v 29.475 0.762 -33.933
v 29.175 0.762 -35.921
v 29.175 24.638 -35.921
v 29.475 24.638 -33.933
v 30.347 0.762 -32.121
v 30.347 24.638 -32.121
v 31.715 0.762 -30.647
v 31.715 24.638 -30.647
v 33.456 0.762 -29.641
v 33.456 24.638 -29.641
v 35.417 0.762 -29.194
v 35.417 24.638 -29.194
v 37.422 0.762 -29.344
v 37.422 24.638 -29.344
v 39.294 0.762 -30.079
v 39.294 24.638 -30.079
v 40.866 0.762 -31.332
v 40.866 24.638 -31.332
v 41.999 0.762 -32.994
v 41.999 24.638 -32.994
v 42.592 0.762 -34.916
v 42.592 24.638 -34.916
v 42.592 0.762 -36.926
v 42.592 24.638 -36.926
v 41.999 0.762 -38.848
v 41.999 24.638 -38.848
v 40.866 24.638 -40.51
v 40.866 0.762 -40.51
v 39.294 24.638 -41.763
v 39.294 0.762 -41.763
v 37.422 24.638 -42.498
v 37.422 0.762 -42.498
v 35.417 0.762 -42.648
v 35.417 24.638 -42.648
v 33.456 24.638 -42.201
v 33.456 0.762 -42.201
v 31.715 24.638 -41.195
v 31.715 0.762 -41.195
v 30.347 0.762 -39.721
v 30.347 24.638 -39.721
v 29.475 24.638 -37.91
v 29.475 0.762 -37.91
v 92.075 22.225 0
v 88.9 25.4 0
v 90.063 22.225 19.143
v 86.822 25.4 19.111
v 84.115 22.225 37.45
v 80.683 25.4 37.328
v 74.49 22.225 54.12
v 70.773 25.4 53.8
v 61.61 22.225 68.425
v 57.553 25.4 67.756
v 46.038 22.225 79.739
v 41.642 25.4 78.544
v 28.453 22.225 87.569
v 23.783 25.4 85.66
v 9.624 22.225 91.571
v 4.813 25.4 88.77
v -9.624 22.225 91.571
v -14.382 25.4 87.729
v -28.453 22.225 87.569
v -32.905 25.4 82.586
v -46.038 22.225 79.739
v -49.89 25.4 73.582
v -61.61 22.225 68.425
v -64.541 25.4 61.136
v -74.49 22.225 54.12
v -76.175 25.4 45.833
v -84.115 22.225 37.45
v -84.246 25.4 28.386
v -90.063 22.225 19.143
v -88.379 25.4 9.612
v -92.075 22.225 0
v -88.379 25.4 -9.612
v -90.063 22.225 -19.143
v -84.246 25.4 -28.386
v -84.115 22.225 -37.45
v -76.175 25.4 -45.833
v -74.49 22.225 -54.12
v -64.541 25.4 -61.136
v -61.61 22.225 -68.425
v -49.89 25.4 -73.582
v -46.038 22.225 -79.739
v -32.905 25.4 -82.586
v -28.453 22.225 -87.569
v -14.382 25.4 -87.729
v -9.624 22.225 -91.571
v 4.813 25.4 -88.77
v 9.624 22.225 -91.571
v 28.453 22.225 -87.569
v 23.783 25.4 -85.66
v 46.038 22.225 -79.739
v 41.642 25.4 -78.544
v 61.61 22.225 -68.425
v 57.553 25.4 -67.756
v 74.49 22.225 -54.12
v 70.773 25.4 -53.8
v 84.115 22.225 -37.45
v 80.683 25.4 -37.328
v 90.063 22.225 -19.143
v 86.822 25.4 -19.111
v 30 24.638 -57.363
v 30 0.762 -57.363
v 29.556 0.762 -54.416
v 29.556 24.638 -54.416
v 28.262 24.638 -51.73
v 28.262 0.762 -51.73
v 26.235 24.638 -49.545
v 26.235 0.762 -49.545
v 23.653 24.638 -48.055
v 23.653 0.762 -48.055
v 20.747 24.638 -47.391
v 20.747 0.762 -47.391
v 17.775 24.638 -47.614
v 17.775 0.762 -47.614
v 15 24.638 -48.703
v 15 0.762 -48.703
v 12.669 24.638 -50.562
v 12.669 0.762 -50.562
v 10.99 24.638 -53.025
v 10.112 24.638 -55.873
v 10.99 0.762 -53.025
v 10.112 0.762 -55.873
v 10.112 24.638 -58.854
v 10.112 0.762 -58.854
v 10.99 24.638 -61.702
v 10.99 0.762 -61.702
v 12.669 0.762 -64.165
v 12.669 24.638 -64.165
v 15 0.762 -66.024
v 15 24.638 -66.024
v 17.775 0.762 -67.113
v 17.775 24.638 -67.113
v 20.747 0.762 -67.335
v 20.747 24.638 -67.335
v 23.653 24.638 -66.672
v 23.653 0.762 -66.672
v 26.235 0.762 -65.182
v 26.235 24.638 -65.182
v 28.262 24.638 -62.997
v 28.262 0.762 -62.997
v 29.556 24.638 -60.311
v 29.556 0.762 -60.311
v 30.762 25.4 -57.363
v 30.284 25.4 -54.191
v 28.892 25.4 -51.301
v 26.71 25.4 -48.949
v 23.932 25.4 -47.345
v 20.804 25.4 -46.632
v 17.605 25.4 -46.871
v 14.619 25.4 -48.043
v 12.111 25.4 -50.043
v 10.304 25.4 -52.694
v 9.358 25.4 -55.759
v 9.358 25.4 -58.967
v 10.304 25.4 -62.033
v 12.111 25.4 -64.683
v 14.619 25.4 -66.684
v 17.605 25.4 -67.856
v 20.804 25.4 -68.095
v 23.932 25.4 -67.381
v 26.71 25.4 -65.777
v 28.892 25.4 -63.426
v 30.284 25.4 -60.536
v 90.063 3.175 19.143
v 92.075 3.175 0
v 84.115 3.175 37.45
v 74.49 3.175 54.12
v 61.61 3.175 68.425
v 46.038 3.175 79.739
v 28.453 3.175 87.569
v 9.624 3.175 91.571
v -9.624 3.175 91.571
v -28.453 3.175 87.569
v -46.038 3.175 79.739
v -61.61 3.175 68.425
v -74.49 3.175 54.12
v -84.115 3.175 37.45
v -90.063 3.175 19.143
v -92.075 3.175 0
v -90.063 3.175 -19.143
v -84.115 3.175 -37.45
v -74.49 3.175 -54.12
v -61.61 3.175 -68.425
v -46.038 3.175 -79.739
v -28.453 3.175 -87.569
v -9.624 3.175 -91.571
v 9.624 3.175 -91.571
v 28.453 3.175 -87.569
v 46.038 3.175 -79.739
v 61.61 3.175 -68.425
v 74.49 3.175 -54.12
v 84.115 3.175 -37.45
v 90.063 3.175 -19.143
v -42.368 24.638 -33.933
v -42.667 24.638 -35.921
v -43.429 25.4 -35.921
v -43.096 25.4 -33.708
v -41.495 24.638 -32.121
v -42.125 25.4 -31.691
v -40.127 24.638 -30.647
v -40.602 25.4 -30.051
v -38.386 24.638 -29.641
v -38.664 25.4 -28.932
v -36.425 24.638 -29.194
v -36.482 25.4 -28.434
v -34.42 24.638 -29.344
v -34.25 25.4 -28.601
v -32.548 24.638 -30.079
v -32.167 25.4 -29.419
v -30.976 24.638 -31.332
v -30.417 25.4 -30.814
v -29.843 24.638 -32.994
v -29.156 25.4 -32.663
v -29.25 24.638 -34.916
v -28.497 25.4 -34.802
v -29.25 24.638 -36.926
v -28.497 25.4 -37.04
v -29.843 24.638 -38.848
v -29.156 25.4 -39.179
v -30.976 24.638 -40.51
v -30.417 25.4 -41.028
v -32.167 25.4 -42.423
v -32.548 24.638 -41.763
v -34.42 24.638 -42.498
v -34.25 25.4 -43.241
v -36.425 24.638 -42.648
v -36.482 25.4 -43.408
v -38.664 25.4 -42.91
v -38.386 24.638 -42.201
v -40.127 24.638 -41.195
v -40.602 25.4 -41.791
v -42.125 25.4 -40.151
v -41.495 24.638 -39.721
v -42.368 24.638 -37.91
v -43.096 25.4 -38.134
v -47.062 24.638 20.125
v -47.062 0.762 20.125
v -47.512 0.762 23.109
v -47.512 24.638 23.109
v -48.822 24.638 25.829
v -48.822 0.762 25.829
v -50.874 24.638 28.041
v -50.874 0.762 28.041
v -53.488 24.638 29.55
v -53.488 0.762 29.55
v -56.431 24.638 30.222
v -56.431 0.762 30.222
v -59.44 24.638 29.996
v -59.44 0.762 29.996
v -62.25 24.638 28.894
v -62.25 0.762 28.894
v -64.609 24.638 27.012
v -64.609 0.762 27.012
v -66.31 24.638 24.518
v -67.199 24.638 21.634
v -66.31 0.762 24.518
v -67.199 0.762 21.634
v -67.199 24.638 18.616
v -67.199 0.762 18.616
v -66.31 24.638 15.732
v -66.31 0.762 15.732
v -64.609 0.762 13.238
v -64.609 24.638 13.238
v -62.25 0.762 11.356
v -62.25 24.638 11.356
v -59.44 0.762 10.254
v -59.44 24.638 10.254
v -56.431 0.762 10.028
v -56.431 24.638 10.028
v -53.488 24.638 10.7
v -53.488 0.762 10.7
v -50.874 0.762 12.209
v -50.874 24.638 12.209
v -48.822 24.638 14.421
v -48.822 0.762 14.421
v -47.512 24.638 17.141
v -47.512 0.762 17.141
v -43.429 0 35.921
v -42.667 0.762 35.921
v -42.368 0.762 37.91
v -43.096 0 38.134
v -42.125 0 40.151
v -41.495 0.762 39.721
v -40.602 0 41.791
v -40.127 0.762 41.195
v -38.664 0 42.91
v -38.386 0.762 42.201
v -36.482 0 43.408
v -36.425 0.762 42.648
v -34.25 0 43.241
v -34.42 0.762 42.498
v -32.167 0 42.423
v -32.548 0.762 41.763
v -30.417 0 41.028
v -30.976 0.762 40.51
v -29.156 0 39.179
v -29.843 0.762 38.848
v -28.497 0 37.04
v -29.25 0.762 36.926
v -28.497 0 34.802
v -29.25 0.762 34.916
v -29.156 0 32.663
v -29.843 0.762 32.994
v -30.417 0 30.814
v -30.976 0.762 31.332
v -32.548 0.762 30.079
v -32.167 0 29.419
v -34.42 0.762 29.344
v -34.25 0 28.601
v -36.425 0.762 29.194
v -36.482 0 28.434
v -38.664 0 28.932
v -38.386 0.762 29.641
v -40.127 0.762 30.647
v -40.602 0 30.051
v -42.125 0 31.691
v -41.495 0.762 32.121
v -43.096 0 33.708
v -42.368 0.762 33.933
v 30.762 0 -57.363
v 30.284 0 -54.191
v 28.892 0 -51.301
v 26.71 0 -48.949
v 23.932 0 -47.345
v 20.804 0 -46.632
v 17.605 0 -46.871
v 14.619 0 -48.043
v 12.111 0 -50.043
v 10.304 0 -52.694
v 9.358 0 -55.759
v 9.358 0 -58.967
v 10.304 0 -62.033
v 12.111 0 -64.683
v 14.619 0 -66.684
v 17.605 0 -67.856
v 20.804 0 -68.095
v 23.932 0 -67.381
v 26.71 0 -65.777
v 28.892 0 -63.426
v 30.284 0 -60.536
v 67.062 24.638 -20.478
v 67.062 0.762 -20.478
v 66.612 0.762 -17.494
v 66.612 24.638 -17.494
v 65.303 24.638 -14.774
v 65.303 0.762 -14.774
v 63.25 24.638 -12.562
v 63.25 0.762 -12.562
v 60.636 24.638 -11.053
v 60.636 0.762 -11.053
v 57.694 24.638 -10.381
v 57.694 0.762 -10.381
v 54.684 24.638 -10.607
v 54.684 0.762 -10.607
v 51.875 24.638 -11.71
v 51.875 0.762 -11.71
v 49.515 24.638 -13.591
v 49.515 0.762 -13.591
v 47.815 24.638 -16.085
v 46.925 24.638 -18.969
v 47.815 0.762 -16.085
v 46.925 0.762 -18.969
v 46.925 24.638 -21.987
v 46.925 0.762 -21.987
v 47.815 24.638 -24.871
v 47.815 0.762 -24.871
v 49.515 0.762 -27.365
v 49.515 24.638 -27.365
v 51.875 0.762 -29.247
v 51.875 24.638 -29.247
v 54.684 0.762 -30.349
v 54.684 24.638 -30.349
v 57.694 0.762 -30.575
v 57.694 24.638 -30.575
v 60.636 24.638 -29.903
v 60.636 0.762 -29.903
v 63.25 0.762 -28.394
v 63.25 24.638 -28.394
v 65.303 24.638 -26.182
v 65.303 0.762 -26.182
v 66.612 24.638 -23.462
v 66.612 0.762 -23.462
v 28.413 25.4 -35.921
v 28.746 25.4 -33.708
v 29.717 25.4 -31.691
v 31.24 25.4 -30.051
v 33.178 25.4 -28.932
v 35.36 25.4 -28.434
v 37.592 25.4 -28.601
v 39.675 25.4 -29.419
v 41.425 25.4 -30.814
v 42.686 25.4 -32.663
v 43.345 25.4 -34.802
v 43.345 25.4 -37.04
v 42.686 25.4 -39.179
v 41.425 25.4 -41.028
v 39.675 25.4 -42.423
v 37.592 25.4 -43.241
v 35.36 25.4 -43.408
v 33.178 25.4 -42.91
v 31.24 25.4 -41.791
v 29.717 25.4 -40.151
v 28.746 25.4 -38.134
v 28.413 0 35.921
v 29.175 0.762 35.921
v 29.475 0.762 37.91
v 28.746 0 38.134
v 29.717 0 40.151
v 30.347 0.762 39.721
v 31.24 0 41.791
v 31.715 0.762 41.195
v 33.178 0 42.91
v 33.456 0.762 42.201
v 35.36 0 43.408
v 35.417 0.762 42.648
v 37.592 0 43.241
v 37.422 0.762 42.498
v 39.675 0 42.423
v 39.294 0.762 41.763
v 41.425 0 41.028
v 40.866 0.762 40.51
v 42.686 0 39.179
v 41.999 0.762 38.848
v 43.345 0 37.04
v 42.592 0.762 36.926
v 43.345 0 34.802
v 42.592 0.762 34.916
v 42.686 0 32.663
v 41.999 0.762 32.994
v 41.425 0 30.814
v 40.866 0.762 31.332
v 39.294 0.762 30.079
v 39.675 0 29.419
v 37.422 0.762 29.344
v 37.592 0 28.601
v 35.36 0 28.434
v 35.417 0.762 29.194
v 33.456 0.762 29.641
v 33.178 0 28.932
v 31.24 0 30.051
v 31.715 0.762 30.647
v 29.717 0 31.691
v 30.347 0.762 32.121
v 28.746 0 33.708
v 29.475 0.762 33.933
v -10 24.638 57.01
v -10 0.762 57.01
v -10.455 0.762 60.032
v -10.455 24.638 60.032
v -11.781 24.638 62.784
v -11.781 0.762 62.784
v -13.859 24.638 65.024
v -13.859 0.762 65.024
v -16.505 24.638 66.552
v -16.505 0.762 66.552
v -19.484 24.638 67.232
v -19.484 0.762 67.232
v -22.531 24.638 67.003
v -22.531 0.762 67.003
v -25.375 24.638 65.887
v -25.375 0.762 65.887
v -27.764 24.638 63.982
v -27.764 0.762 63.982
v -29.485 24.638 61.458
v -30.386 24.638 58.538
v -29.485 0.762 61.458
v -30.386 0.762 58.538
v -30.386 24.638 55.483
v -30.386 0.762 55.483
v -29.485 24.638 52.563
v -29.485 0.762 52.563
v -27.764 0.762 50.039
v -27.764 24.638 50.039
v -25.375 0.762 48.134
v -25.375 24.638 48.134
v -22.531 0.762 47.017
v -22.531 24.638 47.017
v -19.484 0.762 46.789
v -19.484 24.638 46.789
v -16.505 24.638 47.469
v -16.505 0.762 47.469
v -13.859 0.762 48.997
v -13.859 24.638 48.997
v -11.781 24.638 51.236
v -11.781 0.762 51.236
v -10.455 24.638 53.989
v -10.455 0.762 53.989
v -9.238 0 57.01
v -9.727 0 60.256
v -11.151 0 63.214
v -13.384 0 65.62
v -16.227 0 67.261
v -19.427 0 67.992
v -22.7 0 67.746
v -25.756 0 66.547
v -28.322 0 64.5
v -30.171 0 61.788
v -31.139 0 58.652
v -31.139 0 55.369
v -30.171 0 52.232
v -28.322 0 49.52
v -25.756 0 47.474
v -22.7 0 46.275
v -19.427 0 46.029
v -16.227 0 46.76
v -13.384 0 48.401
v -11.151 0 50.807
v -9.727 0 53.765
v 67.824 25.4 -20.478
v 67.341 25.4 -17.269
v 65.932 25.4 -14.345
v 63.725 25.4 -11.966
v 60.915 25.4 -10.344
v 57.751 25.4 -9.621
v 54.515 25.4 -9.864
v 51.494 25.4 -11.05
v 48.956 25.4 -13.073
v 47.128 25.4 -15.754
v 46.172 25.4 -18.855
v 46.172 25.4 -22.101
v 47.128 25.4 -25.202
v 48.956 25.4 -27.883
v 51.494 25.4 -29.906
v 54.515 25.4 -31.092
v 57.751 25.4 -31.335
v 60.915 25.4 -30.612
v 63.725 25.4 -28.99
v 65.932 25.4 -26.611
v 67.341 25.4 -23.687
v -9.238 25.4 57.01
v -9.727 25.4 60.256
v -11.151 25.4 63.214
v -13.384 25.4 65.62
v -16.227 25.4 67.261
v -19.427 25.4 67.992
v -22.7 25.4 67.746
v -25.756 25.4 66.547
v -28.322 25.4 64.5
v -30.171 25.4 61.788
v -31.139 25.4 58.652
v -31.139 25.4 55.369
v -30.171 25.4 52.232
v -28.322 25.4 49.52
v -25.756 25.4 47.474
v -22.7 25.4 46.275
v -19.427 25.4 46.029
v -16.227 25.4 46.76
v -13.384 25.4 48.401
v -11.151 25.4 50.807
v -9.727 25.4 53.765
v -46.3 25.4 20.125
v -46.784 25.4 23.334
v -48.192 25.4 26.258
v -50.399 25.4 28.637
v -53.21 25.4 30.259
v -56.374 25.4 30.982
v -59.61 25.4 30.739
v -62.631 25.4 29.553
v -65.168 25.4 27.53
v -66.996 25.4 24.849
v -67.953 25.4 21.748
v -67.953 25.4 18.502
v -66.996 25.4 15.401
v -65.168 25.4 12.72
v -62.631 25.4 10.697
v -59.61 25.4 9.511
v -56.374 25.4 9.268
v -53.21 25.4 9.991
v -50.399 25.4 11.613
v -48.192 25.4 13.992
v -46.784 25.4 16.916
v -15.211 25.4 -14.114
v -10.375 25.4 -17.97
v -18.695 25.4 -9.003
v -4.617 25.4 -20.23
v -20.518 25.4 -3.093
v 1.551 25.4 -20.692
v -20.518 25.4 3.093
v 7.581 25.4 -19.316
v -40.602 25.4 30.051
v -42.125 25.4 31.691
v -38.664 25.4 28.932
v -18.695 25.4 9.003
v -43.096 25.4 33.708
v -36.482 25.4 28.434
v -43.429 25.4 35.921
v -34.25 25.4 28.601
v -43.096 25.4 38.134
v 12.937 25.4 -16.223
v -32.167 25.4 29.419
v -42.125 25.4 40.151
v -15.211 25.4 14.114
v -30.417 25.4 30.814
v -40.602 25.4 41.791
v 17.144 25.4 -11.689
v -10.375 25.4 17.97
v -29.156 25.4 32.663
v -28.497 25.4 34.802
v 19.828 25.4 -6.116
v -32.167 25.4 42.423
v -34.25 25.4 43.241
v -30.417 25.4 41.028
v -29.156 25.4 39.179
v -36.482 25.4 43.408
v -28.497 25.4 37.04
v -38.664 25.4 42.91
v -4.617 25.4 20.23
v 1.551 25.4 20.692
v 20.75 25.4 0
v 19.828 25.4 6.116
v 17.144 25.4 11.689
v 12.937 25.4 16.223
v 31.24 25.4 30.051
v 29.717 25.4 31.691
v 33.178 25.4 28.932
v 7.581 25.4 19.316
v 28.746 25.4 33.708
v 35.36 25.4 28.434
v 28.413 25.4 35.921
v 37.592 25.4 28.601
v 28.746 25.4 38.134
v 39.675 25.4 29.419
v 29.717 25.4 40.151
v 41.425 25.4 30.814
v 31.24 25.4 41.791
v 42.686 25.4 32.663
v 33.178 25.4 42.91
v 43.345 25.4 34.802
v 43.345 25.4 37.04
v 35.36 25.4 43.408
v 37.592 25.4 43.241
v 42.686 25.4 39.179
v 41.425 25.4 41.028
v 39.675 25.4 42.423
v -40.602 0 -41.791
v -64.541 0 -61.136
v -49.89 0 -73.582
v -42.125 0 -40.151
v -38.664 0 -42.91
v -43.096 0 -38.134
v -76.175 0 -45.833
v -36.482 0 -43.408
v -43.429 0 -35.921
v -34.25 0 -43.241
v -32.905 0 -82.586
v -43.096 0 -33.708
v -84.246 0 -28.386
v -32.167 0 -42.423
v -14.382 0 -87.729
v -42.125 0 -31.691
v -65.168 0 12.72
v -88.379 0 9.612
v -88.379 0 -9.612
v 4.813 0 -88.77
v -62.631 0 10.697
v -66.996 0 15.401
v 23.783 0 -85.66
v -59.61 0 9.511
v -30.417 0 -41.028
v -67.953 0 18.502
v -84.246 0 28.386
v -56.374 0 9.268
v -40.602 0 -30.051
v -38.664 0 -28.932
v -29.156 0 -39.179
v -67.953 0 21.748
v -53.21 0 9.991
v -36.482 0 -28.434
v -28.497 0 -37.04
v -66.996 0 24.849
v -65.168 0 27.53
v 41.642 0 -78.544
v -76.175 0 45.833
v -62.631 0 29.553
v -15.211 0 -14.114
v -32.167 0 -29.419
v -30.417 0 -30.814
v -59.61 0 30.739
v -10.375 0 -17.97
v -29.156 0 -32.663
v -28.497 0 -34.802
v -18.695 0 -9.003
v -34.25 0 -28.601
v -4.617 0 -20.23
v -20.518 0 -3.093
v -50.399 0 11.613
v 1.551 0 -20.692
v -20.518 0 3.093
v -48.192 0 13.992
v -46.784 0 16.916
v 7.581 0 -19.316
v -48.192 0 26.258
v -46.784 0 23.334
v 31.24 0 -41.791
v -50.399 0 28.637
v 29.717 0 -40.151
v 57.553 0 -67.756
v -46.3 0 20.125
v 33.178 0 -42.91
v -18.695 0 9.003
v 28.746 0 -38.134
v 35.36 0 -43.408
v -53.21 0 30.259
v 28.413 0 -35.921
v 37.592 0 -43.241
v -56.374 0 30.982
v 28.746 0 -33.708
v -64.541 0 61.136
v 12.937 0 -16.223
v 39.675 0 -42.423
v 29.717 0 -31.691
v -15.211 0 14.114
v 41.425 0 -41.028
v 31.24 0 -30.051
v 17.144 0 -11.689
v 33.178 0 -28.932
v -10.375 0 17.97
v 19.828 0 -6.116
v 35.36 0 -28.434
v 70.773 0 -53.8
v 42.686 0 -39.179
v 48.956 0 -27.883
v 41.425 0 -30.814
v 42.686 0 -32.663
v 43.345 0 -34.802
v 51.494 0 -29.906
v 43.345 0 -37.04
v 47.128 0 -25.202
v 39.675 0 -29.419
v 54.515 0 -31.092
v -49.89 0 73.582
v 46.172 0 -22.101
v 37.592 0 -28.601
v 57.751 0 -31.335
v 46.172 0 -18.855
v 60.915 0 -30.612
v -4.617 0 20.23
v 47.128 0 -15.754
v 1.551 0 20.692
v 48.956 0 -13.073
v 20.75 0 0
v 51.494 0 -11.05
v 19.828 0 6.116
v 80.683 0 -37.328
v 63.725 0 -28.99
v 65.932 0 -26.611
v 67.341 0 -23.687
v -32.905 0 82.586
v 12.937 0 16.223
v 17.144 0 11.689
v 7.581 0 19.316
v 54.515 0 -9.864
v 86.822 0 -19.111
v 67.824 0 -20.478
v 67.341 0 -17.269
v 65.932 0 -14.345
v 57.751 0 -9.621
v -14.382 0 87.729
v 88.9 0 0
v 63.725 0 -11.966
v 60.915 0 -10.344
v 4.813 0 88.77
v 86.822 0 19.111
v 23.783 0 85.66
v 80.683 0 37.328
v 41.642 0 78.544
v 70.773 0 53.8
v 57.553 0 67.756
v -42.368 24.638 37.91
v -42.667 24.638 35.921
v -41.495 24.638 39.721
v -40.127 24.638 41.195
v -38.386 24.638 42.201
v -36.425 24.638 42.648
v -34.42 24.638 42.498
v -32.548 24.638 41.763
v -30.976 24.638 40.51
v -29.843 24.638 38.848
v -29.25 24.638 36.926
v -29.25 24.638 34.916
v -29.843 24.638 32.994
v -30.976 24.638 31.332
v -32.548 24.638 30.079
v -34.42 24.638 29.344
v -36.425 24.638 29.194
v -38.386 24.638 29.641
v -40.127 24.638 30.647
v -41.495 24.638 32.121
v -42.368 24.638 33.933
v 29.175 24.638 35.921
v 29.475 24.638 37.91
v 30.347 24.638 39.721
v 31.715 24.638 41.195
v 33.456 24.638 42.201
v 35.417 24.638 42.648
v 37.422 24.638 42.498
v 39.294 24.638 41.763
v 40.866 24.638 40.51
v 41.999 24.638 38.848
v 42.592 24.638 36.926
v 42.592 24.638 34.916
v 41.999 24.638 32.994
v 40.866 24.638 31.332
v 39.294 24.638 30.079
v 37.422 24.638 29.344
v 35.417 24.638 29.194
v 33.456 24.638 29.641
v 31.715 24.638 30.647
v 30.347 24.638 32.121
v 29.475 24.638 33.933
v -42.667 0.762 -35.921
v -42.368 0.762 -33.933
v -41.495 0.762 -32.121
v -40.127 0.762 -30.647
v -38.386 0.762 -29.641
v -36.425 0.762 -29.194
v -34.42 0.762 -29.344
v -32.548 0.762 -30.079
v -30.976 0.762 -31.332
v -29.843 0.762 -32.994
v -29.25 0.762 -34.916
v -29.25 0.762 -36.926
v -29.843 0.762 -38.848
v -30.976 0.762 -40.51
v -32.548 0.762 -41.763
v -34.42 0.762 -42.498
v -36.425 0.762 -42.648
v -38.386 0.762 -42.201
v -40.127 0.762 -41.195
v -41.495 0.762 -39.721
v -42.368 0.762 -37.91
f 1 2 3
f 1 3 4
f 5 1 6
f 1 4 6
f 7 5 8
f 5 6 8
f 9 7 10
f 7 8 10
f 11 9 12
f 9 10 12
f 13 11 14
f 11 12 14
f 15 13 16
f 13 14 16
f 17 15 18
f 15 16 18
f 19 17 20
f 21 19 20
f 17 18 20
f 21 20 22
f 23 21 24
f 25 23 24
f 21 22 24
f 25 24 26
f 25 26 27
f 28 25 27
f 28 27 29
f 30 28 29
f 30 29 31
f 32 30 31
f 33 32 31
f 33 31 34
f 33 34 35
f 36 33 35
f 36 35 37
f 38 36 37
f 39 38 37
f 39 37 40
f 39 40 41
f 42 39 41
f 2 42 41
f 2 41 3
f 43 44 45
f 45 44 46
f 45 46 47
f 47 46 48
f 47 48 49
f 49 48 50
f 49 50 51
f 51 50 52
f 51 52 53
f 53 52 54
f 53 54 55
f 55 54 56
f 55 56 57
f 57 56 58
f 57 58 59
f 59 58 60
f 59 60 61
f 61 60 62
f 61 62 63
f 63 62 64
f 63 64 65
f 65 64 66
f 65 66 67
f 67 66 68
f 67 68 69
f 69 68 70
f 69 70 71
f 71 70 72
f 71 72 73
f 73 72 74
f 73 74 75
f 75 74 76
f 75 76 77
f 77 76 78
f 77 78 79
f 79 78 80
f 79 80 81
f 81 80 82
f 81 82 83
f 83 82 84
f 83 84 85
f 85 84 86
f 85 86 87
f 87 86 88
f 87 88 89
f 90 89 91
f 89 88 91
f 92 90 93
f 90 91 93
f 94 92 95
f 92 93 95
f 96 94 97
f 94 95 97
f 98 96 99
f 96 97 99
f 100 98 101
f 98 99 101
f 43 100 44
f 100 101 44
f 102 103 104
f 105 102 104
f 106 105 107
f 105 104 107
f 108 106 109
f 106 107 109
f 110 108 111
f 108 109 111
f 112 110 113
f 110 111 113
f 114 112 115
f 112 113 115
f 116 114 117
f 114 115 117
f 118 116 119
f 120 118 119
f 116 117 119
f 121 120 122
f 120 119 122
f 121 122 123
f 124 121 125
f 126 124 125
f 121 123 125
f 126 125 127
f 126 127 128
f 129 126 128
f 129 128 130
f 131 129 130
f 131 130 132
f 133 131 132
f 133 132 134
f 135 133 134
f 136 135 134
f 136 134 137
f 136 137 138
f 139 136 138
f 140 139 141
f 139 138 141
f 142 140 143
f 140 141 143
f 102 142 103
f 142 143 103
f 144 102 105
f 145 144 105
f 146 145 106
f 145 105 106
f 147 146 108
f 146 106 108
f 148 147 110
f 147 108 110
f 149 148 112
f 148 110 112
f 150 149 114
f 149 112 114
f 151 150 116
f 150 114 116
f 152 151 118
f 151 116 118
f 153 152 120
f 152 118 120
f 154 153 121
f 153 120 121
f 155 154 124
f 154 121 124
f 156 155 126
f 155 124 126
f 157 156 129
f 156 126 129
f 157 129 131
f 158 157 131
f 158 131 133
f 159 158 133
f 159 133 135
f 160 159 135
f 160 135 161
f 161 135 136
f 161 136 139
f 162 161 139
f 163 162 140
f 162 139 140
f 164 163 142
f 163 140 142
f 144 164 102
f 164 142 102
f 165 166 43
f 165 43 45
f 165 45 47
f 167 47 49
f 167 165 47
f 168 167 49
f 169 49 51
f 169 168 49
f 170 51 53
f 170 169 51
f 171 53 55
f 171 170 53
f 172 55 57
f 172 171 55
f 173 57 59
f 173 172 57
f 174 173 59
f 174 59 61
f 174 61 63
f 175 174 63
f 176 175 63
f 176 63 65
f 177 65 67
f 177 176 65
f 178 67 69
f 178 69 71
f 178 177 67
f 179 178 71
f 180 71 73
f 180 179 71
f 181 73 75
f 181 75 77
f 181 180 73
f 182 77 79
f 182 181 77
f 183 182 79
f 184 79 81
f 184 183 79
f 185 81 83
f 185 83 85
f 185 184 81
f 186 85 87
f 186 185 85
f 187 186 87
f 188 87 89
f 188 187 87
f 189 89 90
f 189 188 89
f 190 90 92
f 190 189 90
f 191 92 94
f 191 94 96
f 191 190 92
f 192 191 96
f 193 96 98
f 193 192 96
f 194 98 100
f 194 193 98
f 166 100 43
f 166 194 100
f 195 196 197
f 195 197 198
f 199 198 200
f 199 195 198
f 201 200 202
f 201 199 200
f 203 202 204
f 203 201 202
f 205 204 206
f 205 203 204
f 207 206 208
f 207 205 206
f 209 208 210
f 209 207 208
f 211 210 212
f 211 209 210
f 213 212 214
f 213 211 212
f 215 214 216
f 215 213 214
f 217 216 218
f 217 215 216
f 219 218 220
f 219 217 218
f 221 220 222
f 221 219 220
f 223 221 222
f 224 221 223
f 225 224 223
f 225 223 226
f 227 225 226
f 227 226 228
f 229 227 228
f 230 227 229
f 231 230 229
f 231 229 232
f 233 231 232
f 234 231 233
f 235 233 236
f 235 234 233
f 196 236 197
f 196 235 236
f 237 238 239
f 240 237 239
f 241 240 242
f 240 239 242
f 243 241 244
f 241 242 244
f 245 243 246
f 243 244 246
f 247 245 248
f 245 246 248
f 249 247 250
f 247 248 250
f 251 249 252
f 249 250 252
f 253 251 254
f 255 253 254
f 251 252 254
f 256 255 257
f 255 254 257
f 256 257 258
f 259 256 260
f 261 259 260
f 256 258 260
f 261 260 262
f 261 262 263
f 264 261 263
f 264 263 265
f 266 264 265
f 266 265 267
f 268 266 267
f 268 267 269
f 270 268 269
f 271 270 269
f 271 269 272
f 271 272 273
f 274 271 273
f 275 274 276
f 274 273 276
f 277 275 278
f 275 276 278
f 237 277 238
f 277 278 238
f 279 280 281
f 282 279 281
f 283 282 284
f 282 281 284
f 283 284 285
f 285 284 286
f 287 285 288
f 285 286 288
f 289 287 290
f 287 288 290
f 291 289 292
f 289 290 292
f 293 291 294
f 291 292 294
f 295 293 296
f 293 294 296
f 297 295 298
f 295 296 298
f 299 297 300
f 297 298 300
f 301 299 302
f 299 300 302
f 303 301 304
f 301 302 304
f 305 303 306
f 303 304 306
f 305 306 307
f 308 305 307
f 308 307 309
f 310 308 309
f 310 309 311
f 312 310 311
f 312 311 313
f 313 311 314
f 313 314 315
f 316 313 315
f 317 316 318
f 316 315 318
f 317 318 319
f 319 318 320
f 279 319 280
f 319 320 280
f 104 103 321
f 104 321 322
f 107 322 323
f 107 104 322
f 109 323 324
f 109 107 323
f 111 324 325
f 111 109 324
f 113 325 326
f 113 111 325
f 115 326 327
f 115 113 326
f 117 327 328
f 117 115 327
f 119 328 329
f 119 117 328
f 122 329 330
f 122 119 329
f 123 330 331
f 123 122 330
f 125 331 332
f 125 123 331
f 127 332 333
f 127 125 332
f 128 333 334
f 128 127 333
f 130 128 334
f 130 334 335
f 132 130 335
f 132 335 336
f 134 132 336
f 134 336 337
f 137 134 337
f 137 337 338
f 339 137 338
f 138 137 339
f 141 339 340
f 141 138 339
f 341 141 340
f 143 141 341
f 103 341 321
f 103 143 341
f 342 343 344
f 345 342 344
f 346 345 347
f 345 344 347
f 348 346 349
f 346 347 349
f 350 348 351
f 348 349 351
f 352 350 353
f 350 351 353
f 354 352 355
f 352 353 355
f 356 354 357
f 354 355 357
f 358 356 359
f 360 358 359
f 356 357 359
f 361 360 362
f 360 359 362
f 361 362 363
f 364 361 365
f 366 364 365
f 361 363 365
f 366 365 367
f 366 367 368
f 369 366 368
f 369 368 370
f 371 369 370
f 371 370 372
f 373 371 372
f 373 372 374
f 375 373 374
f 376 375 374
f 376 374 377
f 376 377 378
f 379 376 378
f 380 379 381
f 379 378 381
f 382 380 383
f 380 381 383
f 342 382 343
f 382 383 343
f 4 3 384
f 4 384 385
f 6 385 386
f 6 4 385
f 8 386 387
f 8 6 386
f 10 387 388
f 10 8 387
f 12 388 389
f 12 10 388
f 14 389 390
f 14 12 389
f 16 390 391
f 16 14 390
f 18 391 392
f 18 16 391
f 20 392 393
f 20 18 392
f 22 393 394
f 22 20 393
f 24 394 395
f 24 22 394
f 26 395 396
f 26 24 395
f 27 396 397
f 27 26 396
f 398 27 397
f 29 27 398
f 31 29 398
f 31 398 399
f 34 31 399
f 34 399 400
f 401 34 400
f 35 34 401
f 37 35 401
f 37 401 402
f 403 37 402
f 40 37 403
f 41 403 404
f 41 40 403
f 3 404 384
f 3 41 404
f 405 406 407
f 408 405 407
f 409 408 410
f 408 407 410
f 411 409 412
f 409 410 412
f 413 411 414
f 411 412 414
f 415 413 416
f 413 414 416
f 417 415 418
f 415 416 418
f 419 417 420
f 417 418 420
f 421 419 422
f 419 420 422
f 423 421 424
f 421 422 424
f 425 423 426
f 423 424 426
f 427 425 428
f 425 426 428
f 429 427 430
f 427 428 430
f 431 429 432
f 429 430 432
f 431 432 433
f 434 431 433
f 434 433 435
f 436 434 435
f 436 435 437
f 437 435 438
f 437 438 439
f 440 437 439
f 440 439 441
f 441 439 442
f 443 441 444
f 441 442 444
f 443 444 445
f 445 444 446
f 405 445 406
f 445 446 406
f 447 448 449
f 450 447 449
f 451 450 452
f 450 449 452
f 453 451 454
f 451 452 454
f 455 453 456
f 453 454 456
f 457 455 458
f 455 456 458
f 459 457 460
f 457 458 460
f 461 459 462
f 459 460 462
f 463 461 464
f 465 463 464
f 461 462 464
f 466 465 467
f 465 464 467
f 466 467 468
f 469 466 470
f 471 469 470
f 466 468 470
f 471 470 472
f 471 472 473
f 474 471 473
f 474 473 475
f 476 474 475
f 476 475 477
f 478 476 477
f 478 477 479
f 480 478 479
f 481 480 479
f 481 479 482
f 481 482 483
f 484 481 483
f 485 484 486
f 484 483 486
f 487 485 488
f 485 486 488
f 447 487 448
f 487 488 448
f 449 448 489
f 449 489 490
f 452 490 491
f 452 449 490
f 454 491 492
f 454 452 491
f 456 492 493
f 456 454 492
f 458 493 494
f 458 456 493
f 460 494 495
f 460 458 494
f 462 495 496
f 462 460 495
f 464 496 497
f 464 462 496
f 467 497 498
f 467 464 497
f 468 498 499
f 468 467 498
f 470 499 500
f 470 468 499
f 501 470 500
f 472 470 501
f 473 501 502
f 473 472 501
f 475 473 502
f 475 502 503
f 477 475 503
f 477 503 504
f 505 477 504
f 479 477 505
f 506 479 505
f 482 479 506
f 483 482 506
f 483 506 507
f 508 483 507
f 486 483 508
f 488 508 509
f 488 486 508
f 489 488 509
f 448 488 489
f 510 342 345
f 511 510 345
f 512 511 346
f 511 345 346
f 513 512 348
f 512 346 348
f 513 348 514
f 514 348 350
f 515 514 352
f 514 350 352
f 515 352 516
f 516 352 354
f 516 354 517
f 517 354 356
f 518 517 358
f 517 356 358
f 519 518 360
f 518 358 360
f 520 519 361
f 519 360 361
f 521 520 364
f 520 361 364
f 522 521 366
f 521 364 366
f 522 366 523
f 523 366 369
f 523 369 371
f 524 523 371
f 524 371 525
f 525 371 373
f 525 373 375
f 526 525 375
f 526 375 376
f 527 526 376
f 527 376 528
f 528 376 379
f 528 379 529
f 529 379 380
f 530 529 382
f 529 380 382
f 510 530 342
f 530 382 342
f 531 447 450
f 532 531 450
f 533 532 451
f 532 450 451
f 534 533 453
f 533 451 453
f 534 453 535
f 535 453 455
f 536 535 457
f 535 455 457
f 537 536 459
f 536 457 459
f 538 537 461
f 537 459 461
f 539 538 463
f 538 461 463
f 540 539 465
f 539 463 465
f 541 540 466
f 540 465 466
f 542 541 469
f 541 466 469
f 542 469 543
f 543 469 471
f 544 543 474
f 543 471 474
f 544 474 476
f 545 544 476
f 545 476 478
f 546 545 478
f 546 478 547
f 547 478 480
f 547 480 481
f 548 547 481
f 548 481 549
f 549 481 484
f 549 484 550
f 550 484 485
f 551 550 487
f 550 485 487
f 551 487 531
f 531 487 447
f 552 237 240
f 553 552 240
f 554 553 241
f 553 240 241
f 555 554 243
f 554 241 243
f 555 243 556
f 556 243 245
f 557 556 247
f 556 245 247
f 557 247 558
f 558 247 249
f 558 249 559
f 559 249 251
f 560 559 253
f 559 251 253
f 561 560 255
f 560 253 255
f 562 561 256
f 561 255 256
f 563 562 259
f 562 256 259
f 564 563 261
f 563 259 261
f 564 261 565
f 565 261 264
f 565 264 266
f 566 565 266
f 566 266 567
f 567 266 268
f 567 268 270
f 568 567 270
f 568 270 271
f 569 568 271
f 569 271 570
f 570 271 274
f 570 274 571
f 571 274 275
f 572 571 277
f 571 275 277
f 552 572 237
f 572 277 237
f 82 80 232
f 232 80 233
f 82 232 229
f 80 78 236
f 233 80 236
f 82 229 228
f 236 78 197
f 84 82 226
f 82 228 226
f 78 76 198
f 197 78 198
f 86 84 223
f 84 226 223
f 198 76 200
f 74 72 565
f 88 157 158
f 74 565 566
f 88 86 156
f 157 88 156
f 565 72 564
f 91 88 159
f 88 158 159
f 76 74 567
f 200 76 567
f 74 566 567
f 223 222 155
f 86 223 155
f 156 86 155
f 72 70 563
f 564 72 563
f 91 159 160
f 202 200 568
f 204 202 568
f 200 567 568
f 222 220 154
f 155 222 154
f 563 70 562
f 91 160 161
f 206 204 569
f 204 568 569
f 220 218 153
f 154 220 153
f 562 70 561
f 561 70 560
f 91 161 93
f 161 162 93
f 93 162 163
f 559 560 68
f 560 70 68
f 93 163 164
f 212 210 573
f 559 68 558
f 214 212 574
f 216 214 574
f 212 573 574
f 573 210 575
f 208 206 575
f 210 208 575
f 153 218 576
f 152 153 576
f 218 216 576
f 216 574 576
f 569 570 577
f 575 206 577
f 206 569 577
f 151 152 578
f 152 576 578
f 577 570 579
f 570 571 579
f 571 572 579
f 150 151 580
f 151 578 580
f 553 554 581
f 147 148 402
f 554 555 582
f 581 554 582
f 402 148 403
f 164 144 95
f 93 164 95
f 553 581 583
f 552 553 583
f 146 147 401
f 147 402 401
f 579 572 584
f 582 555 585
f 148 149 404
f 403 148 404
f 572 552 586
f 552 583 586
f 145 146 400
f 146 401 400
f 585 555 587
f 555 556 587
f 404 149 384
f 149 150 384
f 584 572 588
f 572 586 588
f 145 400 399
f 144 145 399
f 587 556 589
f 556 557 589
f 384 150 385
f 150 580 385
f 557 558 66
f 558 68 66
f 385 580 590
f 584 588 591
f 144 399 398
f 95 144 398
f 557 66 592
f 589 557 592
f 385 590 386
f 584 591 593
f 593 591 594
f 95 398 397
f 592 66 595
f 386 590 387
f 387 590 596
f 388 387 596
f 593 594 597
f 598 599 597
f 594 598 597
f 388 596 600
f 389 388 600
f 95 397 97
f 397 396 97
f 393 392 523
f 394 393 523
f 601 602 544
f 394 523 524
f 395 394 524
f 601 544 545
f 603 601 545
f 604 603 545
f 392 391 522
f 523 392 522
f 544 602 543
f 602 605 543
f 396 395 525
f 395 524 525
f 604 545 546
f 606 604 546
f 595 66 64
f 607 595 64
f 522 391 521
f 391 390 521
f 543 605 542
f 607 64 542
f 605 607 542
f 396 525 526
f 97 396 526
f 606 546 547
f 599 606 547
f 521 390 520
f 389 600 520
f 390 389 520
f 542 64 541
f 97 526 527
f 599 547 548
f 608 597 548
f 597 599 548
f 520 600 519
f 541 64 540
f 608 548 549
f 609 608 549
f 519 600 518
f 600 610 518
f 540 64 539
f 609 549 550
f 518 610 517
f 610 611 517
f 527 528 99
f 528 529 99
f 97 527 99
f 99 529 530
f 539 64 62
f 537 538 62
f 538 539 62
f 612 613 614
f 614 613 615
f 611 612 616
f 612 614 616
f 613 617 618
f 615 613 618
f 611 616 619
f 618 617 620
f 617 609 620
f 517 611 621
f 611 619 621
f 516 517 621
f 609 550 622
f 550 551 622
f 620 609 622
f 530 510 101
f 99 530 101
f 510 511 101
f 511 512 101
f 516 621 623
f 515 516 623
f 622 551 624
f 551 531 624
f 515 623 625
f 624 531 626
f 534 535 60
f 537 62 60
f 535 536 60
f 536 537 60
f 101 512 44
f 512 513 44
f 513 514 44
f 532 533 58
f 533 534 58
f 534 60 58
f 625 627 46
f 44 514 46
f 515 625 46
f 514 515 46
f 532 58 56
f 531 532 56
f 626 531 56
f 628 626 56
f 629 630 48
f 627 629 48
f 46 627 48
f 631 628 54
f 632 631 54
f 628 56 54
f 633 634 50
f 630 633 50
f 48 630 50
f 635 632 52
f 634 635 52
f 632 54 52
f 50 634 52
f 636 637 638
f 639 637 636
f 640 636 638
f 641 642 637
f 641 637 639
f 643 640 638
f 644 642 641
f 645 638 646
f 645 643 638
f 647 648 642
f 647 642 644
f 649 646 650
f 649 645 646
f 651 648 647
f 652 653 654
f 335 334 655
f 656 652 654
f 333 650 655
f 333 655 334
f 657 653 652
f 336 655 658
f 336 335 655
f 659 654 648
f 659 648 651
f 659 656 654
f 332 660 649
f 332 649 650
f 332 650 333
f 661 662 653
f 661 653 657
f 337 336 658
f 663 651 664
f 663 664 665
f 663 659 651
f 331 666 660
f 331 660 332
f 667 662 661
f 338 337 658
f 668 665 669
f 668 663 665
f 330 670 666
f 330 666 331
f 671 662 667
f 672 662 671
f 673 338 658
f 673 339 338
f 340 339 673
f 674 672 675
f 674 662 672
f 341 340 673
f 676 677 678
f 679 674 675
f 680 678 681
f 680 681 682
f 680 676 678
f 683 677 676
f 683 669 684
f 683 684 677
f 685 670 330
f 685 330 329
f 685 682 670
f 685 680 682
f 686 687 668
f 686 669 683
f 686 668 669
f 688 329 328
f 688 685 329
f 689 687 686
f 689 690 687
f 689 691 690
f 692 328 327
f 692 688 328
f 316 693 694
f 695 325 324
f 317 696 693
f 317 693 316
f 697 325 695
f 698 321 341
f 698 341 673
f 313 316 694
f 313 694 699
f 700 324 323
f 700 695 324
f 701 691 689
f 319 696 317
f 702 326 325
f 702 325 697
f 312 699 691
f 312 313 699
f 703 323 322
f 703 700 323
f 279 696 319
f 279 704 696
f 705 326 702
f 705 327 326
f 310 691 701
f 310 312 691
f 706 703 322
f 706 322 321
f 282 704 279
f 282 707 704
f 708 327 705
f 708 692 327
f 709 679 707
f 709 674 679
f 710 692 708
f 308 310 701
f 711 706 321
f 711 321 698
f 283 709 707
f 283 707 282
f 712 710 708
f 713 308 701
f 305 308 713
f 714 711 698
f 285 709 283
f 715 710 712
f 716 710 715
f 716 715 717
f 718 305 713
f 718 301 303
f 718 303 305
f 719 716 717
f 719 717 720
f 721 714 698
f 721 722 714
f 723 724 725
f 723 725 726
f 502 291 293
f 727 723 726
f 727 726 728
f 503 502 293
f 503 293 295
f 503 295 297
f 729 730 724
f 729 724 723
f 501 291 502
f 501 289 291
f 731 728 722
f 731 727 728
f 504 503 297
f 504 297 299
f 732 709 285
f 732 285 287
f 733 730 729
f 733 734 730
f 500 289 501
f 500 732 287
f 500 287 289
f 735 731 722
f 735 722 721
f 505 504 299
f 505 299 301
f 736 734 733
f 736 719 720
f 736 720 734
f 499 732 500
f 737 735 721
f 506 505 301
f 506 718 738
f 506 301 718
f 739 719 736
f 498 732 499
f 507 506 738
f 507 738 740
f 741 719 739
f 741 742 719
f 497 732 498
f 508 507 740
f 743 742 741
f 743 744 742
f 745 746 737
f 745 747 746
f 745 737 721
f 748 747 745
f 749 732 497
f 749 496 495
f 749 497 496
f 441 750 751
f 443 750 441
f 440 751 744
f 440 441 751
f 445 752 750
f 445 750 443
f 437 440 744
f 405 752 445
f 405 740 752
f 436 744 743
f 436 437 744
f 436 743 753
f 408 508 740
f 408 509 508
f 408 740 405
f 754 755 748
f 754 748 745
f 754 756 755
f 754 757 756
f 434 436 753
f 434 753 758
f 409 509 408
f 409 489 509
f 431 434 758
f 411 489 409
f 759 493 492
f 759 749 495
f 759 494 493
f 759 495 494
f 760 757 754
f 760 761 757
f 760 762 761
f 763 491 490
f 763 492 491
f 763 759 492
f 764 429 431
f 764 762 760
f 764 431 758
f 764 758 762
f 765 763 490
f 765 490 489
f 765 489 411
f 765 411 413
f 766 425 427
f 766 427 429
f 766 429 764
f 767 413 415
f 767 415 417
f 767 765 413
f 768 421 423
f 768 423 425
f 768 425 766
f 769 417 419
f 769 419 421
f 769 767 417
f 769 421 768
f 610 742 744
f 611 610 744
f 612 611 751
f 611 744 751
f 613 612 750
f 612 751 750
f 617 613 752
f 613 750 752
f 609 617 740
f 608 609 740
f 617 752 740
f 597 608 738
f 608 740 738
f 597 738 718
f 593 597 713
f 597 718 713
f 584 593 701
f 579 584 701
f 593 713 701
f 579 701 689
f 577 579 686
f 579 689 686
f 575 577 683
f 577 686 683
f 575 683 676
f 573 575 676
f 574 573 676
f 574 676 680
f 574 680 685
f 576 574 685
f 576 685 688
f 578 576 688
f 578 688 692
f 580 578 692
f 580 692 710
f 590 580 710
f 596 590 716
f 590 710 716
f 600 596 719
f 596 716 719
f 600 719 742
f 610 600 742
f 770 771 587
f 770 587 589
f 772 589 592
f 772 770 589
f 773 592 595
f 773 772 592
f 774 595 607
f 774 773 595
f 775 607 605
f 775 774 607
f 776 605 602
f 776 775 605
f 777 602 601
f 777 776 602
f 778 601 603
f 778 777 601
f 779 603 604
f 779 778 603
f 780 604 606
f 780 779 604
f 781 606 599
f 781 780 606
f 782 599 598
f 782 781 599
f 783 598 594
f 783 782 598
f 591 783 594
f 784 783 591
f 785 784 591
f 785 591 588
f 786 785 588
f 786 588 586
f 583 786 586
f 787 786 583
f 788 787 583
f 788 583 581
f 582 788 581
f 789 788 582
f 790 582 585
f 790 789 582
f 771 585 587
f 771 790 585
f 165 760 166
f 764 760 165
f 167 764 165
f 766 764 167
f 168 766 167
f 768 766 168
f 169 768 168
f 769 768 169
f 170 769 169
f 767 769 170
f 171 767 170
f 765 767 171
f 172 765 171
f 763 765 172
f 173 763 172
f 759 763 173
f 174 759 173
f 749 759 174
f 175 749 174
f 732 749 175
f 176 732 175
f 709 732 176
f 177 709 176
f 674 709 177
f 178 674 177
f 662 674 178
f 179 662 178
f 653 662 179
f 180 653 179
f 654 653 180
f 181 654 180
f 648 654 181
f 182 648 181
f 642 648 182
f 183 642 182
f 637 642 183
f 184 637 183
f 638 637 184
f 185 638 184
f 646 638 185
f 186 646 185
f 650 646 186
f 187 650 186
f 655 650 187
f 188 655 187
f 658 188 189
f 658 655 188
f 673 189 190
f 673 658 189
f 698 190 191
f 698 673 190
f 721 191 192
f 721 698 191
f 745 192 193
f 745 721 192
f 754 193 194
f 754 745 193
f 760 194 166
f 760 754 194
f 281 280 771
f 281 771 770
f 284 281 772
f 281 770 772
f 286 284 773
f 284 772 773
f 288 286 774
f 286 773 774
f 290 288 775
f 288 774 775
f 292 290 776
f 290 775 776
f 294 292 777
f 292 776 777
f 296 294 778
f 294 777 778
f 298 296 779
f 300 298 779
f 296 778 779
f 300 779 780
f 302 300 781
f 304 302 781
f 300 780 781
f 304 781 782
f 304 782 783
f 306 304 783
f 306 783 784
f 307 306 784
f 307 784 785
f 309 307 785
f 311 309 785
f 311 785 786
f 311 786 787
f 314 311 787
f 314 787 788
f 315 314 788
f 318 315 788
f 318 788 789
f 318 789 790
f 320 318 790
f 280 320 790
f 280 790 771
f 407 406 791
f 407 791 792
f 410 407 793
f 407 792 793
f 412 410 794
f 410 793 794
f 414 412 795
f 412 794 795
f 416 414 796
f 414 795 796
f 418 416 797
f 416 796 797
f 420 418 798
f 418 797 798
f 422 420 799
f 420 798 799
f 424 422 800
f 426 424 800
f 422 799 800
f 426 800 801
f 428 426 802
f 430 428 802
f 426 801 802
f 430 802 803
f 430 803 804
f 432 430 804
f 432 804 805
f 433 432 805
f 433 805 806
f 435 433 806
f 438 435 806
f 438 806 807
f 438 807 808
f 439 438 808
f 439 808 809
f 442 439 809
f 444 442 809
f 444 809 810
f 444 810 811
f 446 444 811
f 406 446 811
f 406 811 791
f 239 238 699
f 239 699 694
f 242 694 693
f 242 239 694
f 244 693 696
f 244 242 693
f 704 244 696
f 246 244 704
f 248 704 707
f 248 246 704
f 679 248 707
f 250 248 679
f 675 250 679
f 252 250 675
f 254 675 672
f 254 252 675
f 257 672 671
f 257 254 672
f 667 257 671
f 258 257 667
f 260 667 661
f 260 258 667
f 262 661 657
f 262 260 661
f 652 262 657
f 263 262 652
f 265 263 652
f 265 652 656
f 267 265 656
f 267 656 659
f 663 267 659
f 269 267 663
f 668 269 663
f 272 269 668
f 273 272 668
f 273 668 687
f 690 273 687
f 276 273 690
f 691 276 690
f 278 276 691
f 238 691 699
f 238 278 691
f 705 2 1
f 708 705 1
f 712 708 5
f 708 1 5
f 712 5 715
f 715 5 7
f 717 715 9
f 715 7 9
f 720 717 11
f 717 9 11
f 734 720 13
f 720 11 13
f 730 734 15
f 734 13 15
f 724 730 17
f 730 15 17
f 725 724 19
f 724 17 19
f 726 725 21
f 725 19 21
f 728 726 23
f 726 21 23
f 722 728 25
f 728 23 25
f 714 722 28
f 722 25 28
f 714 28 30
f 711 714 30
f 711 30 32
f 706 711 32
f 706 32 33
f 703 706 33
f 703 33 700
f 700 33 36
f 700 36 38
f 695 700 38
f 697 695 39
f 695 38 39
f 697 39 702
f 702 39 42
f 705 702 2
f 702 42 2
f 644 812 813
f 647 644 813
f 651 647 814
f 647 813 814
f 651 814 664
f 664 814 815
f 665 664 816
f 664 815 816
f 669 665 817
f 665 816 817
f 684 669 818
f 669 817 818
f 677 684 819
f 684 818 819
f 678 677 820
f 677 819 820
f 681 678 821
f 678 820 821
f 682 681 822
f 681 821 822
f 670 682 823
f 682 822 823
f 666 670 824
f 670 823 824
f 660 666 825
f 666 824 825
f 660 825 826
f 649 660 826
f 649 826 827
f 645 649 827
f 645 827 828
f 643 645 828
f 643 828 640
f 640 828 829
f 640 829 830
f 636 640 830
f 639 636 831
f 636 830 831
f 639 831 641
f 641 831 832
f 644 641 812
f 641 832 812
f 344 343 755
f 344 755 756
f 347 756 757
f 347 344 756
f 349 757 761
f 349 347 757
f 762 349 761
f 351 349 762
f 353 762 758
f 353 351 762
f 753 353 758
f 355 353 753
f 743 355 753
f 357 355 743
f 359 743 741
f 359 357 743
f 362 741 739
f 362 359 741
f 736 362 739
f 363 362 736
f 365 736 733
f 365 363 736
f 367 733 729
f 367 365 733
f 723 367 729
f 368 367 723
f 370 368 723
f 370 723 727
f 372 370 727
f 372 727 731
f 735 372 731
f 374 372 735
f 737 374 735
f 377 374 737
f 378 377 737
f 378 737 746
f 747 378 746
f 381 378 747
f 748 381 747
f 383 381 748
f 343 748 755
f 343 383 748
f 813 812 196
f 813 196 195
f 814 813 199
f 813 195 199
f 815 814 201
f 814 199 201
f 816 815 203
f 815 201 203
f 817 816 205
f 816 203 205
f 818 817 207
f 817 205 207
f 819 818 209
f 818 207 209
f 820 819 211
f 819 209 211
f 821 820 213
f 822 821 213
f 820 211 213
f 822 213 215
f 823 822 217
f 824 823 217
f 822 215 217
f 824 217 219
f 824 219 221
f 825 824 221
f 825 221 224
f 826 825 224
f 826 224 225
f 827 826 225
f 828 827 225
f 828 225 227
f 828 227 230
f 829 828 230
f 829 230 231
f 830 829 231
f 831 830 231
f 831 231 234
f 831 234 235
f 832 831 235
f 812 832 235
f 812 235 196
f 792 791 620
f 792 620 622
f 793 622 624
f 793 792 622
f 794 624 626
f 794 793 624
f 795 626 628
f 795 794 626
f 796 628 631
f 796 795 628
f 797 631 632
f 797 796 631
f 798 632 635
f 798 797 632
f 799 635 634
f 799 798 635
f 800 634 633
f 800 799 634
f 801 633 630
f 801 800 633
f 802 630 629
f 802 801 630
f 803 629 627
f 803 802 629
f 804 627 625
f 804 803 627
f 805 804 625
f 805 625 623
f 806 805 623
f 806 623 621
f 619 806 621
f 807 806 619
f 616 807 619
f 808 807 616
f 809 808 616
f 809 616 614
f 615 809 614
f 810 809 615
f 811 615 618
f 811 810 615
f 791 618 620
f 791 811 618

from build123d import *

# Parameters (mm, degrees)
F0_R     = 92.075
F0_R_2   = 20.75
F1_DEPTH = 25.4
F2_R     = 10.125
F2_R_2   = 10.25
F2_R_3   = 10
F3_DEPTH = 25.4
F5_D     = 13.49248
F6_SIZE  = 3.175
F7_SIZE  = 0.762


with BuildPart() as f1:
    # F0 (on Front) → F1 (new body)
    with BuildSketch(Plane.XZ):
        Circle(F0_R)
        Circle(F0_R_2, mode=Mode.SUBTRACT)
    extrude(amount=-F1_DEPTH)

    # F2 (on face) → F3 (cut)
    with BuildSketch(Plane.XZ):
        with Locations((-57.1871926221, 20.125)):
            Circle(F2_R)
        with Locations((-20.25, 57.010415715)):
            Circle(F2_R_2)
        with Locations((56.9371926221, -20.4780090433)):
            Circle(F2_R)
        with Locations((20, -57.3634247583)):
            Circle(F2_R_3)
    extrude(amount=-F3_DEPTH, mode=Mode.SUBTRACT)

    # F5 (through all)
    with Locations(Plane.XZ):
        with Locations((-35.9210244843, 35.9210244843), (35.9210244843, 35.9210244843), (35.9210244843, -35.9210244843), (-35.9210244843, -35.9210244843)):
            Hole(F5_D / 2)

    # F6
    f6_edges = [f1.edges().sort_by_distance(p)[0] for p in [
        (92.075, 12.7, 0),
        (-92.075, 0, 0),
        (-92.075, 25.4, 0),
    ]]
    chamfer(f6_edges, length=F6_SIZE)

    # F7
    f7_edges = [f1.edges().sort_by_distance(p)[0] for p in [
        (-47.062193, 12.7, 20.125),
        (-67.312193, 0, 20.125),
        (-67.312193, 25.4, 20.125),
        (-10, 12.7, 57.010416),
        (-30.5, 0, 57.010416),
        (-30.5, 25.4, 57.010416),
        (67.062193, 12.7, -20.478009),
        (46.812193, 0, -20.478009),
        (46.812193, 25.4, -20.478009),
        (30, 12.7, -57.363425),
        (10, 0, -57.363425),
        (10, 25.4, -57.363425),
        (-42.667264, 0, -35.921024),
        (29.174784, 0, -35.921024),
        (-42.667264, 0, 35.921024),
        (29.174784, 0, 35.921024),
        (-42.667264, 25.4, -35.921024),
        (29.174784, 25.4, -35.921024),
        (-42.667264, 25.4, 35.921024),
        (29.174784, 25.4, 35.921024),
    ]]
    chamfer(f7_edges, length=F7_SIZE)


solid = f1.part
